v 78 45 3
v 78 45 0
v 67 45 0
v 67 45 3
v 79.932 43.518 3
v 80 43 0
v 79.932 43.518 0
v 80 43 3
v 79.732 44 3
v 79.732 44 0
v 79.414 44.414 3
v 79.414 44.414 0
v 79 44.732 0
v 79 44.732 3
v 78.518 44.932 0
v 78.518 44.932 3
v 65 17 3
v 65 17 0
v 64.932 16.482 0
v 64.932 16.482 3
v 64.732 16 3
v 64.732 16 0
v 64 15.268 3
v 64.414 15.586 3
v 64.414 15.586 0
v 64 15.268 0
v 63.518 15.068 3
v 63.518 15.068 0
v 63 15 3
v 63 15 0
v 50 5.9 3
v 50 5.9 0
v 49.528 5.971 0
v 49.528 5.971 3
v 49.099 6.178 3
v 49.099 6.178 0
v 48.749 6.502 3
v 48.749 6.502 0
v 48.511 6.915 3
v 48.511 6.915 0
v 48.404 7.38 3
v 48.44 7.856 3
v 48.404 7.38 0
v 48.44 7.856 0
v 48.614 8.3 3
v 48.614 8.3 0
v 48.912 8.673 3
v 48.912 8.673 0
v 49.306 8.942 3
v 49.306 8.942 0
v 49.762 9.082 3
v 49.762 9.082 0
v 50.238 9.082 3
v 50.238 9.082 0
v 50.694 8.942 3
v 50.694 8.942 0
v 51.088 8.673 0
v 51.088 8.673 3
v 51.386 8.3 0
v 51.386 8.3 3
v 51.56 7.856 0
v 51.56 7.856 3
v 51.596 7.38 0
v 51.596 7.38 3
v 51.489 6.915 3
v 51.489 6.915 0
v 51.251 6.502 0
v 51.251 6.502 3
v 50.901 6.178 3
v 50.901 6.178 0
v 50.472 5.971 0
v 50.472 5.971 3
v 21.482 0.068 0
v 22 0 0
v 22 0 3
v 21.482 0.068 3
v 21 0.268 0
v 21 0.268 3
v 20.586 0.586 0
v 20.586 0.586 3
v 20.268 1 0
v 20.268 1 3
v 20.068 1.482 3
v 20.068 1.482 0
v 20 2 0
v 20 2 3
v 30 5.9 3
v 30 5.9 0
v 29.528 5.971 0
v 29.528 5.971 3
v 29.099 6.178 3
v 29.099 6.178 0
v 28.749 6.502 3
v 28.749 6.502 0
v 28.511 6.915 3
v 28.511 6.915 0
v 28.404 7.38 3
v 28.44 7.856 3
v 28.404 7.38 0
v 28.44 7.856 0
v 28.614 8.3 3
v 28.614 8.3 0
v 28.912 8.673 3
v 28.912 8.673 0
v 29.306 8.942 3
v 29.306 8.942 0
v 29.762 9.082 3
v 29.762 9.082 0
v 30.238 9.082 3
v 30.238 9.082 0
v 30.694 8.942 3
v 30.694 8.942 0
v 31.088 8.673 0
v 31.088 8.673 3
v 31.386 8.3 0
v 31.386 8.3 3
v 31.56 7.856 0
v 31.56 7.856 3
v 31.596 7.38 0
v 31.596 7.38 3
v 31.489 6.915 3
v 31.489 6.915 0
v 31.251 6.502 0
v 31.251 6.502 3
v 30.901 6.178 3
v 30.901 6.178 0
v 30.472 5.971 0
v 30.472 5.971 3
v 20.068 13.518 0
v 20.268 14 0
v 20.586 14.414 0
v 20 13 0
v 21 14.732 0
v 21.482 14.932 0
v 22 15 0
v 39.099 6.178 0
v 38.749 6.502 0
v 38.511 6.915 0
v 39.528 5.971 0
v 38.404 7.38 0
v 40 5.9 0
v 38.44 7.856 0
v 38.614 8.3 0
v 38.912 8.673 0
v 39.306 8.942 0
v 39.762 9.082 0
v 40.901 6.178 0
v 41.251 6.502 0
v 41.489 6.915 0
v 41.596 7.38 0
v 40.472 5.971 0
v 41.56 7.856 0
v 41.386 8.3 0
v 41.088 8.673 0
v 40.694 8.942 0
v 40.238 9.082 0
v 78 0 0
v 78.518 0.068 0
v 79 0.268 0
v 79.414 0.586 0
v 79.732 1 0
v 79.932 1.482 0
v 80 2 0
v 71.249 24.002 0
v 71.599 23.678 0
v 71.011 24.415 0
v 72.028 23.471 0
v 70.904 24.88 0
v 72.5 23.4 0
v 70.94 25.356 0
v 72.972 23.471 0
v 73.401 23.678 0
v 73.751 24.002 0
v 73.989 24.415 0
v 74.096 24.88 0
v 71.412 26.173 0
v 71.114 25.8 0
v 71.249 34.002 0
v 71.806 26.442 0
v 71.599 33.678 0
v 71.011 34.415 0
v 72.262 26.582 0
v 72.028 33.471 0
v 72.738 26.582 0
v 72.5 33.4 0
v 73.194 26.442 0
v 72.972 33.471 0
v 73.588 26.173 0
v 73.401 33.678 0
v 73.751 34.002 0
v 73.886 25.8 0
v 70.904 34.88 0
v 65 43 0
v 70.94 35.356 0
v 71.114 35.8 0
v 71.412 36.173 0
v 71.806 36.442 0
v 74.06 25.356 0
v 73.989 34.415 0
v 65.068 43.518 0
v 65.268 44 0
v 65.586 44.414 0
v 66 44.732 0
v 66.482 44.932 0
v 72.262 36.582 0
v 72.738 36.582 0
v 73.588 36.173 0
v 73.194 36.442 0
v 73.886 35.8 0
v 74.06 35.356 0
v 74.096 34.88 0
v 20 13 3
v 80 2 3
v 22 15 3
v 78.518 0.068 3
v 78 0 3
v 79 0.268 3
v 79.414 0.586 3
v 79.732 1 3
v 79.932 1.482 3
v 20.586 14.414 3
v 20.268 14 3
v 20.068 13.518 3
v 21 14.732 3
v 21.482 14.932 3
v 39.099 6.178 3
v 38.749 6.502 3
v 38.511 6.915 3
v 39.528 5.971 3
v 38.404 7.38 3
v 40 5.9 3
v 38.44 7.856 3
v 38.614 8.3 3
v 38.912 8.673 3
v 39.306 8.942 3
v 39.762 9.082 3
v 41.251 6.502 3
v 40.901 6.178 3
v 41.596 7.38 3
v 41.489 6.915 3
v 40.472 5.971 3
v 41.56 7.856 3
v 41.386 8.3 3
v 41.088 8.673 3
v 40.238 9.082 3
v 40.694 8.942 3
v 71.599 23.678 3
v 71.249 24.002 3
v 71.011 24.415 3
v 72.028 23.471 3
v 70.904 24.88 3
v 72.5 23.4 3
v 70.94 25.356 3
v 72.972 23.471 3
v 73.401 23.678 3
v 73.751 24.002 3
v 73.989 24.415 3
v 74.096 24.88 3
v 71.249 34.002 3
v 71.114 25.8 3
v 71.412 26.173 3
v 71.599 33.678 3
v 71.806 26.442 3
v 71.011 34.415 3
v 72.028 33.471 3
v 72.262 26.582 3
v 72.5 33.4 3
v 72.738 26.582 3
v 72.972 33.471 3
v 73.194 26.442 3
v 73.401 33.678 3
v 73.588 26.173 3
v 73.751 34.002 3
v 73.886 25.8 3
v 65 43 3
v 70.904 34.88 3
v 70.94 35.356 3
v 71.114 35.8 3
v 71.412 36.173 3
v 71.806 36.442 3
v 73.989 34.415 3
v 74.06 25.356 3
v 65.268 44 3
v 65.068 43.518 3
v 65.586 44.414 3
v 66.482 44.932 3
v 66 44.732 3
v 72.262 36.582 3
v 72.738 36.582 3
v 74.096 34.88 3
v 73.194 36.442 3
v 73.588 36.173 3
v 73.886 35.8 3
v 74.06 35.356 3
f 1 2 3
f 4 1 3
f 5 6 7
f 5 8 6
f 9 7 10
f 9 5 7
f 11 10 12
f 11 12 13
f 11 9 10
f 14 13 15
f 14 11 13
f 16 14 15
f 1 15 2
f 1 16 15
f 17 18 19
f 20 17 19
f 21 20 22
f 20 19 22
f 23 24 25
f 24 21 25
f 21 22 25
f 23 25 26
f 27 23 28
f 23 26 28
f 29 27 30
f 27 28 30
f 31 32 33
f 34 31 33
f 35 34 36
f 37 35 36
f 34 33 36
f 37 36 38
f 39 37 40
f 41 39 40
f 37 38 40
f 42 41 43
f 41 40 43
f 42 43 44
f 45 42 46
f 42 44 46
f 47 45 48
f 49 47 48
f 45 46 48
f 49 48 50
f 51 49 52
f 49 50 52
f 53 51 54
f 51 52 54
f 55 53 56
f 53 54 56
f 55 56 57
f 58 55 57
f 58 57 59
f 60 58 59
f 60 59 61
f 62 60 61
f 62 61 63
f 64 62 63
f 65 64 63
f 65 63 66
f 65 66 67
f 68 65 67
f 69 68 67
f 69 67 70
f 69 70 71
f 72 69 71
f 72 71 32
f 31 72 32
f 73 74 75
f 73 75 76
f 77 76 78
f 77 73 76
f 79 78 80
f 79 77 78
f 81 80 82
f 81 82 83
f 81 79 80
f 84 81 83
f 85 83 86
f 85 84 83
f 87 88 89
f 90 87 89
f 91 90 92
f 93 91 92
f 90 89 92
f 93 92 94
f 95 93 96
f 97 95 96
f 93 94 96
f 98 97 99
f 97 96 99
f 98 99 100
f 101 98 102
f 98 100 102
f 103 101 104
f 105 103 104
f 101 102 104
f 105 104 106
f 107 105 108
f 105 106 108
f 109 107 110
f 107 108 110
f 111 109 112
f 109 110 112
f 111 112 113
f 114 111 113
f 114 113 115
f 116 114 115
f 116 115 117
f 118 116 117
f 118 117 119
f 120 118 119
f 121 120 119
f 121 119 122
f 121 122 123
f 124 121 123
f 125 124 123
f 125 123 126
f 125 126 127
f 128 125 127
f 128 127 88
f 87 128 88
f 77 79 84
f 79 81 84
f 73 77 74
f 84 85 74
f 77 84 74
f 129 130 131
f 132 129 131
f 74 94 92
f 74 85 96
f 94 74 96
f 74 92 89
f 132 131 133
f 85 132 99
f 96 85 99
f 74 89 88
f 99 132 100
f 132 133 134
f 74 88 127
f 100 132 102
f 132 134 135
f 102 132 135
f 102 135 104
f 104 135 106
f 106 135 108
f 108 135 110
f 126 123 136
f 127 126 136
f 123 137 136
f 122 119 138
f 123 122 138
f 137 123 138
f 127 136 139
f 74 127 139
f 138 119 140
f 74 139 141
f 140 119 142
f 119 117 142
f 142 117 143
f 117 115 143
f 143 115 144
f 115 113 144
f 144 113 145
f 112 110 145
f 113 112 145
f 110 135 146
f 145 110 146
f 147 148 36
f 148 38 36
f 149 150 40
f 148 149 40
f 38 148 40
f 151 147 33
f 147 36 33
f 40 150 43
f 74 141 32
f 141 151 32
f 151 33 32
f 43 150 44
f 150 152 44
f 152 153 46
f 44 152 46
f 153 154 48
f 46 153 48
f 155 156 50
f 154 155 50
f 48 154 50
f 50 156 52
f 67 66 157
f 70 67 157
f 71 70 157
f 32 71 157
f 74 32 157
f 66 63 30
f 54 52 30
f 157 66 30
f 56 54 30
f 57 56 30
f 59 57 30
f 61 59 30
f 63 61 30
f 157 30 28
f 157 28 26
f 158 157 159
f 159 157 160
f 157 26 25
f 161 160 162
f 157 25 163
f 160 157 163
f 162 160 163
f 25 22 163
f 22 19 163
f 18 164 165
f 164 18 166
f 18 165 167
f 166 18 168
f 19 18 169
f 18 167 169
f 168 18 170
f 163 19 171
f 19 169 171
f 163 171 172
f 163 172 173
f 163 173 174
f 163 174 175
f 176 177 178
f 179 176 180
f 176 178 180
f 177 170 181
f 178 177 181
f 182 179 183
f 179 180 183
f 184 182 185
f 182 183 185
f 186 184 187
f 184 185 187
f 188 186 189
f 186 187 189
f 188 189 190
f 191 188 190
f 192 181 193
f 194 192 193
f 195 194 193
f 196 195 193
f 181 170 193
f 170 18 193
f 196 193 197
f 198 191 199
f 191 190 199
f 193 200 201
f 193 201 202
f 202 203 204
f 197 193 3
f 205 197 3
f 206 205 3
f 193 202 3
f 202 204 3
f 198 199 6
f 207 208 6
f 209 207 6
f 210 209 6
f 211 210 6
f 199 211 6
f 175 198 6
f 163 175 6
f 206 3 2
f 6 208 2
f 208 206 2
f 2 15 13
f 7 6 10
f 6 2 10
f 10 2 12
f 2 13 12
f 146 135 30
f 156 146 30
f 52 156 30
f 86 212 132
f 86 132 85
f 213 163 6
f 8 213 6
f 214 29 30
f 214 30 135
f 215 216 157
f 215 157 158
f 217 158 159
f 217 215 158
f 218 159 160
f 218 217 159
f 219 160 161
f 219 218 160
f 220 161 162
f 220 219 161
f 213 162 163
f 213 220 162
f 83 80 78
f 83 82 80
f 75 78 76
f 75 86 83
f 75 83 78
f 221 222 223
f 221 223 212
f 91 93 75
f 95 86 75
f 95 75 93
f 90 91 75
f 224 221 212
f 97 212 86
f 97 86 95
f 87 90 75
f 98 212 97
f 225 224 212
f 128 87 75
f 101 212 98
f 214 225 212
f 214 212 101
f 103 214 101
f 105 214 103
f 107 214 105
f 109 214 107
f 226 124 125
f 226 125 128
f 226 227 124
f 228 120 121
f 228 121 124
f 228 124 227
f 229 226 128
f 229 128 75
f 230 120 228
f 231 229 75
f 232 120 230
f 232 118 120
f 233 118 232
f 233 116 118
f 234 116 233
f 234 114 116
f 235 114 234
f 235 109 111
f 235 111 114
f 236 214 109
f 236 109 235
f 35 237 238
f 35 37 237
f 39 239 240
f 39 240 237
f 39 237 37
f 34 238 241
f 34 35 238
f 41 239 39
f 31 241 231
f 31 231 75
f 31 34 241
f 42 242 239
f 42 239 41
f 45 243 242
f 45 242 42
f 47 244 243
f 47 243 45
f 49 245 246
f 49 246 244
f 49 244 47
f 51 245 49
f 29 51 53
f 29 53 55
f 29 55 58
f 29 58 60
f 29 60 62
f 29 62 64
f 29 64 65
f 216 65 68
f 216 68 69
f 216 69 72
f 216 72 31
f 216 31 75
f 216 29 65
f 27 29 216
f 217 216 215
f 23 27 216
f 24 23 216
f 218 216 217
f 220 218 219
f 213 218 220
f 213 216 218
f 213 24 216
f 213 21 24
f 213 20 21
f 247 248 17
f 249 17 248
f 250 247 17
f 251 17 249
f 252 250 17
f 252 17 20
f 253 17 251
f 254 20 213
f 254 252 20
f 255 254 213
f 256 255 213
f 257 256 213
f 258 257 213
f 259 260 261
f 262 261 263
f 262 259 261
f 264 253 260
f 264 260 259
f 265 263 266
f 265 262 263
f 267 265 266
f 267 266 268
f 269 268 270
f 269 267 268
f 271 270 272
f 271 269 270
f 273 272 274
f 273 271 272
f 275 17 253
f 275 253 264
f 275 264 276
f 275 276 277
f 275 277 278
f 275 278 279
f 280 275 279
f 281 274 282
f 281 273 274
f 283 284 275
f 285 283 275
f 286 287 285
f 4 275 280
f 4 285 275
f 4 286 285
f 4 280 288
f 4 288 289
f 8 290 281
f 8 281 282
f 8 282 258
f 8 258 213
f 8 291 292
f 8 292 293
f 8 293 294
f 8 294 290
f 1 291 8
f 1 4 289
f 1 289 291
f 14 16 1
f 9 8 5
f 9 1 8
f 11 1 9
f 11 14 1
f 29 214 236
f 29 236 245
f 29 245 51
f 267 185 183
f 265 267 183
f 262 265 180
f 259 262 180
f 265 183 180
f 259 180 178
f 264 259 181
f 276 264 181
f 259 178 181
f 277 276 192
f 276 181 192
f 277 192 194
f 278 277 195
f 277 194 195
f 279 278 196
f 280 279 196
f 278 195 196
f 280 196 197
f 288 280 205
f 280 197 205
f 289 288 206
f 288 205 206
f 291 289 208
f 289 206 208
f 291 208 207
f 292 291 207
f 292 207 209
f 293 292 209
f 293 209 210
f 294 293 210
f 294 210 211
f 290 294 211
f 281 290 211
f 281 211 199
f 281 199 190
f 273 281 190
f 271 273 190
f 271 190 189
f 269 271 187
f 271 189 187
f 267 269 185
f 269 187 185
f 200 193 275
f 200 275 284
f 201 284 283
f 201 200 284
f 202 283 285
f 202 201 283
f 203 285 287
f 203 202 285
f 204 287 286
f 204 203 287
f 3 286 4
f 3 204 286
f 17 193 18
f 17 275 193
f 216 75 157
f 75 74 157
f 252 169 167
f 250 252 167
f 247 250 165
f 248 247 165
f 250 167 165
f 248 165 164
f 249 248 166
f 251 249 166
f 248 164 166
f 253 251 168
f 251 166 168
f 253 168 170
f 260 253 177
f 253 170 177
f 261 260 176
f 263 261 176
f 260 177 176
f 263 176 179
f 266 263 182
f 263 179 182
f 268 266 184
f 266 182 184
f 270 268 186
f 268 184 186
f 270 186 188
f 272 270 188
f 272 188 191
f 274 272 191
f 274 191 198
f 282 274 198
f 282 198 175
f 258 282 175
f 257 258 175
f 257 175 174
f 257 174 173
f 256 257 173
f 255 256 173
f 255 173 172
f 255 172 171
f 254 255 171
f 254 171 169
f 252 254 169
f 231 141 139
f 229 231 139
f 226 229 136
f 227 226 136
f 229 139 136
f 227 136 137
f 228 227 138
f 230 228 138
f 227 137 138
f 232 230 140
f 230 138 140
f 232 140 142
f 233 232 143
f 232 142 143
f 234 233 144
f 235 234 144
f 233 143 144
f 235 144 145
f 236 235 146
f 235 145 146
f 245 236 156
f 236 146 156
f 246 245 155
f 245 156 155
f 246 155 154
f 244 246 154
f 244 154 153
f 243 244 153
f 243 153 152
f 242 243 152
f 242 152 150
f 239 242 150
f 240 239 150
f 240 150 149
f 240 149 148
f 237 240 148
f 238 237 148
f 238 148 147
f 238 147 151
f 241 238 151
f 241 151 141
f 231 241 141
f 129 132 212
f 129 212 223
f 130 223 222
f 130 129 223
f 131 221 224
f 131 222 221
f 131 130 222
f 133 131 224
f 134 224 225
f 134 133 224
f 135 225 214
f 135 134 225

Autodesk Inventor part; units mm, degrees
ref_plane "YZ Plane" through (0, 0, 0) normal (1, 0, 0) x (0, 1, 0)
ref_plane "XZ Plane" through (0, 0, 0) normal (0, 1, 0) x (-1, 0, 0)
ref_plane "XY Plane" through (0, 0, 0) normal (0, 0, 1) x (1, 0, 0)
sketch "スケッチ1" plane through (0, 0, 0) normal (0, 0, 1) x (1, 0, 0)
  line L0 (0, 0) -> (80, 0)
  line L1 (80, 0) -> (80, 45)
  line L2 (80, 45) -> (0, 45)
  line L3 (0, 45) -> (0, 0)
  dimension "d0" = 80
  dimension "d1" = 45
extrude "押し出し1" add sketch "スケッチ1" along normal blind 3
sketch "スケッチ2" plane through (0, 0, 3) normal (0, 0, 1) x (1, 0, 0)
  line L0 (0, 45) -> (0, 0) projected
  line L1 (0, 0) -> (80, 0) projected
  line L2 (80, 45) -> (0, 45) projected
  line L3 (40, 45) -> (40, 0) construction
  point P0 (7.5, 35)
  point P1 (7.5, 25)
  point P2 (30, 7.5)
  point P3 (72.5, 35)
  point P4 (72.5, 25)
  point P5 (50, 7.5)
  point P6 (40, 7.5)
  dimension "d4" = 7.5
  dimension "d5" = 35
  dimension "d6" = 10
  dimension "d7" = 7.5
  dimension "d8" = 7.5
  dimension "d9" = 30
hole "穴1" at (7.5, 35, 3) at (7.5, 25, 3) at (30, 7.5, 3) at (72.5, 35, 3) at (72.5, 25, 3) at (50, 7.5, 3) at (40, 7.5, 3) direction (0, 0, -1) diameter 3.2 end through all
sketch "スケッチ3" plane through (0, 0, 3) normal (0, 0, 1) x (1, 0, 0)
  line L0 (80, 45) -> (0, 45) projected
  line L1 (15, 45) -> (65, 45)
  line L2 (65, 45) -> (65, 15)
  line L3 (65, 15) -> (15, 15)
  line L4 (15, 15) -> (15, 45)
  line L5 (0, 45) -> (0, 0) projected
  line L6 (0, 0) -> (80, 0) projected
  dimension "d17" = 50
  dimension "d18" = 30
  dimension "d19" = 15
  dimension "d20" = 15
extrude "押し出し2" cut sketch "スケッチ3" against normal blind 3
fillet "フィレット1" radius 2 8 edges at (15, 45, 1.5) (65, 15, 1.5) (65, 45, 1.5) (80, 45, 1.5) (0, 45, 1.5) (0, 0, 1.5) (80, 0, 1.5) (15, 15, 1.5)
sketch "スケッチ4" plane through (0, 0, 3) normal (0, 0, 1) x (1, 0, 0)
  line L0 (17, 15) -> (63, 15) projected
  line L1 (20, 15) -> (20, 0)
  line L2 (2, 0) -> (78, 0) projected
  circle A0 centre (30, 7.5) radius 1.6 projected
  line L3 (20, 15) -> (14.3834, 55.3393)
  line L4 (14.3834, 55.3393) -> (-4.9194, 44.4595)
  line L5 (-4.9194, 44.4595) -> (-4.9194, 0)
  line L6 (-4.9194, 0) -> (20, 0)
  point P0 (0, 0)
  dimension "d24" = 10
extrude "押し出し3" cut sketch "スケッチ4" against normal blind 10 contours L1 L2 L6 L5 L4 L3
fillet "フィレット2" radius 2 2 edges at (20, 15, 1.5) (20, 0, 1.5)
properties part number "射出_固定6" material "アルミニウム 6061"
